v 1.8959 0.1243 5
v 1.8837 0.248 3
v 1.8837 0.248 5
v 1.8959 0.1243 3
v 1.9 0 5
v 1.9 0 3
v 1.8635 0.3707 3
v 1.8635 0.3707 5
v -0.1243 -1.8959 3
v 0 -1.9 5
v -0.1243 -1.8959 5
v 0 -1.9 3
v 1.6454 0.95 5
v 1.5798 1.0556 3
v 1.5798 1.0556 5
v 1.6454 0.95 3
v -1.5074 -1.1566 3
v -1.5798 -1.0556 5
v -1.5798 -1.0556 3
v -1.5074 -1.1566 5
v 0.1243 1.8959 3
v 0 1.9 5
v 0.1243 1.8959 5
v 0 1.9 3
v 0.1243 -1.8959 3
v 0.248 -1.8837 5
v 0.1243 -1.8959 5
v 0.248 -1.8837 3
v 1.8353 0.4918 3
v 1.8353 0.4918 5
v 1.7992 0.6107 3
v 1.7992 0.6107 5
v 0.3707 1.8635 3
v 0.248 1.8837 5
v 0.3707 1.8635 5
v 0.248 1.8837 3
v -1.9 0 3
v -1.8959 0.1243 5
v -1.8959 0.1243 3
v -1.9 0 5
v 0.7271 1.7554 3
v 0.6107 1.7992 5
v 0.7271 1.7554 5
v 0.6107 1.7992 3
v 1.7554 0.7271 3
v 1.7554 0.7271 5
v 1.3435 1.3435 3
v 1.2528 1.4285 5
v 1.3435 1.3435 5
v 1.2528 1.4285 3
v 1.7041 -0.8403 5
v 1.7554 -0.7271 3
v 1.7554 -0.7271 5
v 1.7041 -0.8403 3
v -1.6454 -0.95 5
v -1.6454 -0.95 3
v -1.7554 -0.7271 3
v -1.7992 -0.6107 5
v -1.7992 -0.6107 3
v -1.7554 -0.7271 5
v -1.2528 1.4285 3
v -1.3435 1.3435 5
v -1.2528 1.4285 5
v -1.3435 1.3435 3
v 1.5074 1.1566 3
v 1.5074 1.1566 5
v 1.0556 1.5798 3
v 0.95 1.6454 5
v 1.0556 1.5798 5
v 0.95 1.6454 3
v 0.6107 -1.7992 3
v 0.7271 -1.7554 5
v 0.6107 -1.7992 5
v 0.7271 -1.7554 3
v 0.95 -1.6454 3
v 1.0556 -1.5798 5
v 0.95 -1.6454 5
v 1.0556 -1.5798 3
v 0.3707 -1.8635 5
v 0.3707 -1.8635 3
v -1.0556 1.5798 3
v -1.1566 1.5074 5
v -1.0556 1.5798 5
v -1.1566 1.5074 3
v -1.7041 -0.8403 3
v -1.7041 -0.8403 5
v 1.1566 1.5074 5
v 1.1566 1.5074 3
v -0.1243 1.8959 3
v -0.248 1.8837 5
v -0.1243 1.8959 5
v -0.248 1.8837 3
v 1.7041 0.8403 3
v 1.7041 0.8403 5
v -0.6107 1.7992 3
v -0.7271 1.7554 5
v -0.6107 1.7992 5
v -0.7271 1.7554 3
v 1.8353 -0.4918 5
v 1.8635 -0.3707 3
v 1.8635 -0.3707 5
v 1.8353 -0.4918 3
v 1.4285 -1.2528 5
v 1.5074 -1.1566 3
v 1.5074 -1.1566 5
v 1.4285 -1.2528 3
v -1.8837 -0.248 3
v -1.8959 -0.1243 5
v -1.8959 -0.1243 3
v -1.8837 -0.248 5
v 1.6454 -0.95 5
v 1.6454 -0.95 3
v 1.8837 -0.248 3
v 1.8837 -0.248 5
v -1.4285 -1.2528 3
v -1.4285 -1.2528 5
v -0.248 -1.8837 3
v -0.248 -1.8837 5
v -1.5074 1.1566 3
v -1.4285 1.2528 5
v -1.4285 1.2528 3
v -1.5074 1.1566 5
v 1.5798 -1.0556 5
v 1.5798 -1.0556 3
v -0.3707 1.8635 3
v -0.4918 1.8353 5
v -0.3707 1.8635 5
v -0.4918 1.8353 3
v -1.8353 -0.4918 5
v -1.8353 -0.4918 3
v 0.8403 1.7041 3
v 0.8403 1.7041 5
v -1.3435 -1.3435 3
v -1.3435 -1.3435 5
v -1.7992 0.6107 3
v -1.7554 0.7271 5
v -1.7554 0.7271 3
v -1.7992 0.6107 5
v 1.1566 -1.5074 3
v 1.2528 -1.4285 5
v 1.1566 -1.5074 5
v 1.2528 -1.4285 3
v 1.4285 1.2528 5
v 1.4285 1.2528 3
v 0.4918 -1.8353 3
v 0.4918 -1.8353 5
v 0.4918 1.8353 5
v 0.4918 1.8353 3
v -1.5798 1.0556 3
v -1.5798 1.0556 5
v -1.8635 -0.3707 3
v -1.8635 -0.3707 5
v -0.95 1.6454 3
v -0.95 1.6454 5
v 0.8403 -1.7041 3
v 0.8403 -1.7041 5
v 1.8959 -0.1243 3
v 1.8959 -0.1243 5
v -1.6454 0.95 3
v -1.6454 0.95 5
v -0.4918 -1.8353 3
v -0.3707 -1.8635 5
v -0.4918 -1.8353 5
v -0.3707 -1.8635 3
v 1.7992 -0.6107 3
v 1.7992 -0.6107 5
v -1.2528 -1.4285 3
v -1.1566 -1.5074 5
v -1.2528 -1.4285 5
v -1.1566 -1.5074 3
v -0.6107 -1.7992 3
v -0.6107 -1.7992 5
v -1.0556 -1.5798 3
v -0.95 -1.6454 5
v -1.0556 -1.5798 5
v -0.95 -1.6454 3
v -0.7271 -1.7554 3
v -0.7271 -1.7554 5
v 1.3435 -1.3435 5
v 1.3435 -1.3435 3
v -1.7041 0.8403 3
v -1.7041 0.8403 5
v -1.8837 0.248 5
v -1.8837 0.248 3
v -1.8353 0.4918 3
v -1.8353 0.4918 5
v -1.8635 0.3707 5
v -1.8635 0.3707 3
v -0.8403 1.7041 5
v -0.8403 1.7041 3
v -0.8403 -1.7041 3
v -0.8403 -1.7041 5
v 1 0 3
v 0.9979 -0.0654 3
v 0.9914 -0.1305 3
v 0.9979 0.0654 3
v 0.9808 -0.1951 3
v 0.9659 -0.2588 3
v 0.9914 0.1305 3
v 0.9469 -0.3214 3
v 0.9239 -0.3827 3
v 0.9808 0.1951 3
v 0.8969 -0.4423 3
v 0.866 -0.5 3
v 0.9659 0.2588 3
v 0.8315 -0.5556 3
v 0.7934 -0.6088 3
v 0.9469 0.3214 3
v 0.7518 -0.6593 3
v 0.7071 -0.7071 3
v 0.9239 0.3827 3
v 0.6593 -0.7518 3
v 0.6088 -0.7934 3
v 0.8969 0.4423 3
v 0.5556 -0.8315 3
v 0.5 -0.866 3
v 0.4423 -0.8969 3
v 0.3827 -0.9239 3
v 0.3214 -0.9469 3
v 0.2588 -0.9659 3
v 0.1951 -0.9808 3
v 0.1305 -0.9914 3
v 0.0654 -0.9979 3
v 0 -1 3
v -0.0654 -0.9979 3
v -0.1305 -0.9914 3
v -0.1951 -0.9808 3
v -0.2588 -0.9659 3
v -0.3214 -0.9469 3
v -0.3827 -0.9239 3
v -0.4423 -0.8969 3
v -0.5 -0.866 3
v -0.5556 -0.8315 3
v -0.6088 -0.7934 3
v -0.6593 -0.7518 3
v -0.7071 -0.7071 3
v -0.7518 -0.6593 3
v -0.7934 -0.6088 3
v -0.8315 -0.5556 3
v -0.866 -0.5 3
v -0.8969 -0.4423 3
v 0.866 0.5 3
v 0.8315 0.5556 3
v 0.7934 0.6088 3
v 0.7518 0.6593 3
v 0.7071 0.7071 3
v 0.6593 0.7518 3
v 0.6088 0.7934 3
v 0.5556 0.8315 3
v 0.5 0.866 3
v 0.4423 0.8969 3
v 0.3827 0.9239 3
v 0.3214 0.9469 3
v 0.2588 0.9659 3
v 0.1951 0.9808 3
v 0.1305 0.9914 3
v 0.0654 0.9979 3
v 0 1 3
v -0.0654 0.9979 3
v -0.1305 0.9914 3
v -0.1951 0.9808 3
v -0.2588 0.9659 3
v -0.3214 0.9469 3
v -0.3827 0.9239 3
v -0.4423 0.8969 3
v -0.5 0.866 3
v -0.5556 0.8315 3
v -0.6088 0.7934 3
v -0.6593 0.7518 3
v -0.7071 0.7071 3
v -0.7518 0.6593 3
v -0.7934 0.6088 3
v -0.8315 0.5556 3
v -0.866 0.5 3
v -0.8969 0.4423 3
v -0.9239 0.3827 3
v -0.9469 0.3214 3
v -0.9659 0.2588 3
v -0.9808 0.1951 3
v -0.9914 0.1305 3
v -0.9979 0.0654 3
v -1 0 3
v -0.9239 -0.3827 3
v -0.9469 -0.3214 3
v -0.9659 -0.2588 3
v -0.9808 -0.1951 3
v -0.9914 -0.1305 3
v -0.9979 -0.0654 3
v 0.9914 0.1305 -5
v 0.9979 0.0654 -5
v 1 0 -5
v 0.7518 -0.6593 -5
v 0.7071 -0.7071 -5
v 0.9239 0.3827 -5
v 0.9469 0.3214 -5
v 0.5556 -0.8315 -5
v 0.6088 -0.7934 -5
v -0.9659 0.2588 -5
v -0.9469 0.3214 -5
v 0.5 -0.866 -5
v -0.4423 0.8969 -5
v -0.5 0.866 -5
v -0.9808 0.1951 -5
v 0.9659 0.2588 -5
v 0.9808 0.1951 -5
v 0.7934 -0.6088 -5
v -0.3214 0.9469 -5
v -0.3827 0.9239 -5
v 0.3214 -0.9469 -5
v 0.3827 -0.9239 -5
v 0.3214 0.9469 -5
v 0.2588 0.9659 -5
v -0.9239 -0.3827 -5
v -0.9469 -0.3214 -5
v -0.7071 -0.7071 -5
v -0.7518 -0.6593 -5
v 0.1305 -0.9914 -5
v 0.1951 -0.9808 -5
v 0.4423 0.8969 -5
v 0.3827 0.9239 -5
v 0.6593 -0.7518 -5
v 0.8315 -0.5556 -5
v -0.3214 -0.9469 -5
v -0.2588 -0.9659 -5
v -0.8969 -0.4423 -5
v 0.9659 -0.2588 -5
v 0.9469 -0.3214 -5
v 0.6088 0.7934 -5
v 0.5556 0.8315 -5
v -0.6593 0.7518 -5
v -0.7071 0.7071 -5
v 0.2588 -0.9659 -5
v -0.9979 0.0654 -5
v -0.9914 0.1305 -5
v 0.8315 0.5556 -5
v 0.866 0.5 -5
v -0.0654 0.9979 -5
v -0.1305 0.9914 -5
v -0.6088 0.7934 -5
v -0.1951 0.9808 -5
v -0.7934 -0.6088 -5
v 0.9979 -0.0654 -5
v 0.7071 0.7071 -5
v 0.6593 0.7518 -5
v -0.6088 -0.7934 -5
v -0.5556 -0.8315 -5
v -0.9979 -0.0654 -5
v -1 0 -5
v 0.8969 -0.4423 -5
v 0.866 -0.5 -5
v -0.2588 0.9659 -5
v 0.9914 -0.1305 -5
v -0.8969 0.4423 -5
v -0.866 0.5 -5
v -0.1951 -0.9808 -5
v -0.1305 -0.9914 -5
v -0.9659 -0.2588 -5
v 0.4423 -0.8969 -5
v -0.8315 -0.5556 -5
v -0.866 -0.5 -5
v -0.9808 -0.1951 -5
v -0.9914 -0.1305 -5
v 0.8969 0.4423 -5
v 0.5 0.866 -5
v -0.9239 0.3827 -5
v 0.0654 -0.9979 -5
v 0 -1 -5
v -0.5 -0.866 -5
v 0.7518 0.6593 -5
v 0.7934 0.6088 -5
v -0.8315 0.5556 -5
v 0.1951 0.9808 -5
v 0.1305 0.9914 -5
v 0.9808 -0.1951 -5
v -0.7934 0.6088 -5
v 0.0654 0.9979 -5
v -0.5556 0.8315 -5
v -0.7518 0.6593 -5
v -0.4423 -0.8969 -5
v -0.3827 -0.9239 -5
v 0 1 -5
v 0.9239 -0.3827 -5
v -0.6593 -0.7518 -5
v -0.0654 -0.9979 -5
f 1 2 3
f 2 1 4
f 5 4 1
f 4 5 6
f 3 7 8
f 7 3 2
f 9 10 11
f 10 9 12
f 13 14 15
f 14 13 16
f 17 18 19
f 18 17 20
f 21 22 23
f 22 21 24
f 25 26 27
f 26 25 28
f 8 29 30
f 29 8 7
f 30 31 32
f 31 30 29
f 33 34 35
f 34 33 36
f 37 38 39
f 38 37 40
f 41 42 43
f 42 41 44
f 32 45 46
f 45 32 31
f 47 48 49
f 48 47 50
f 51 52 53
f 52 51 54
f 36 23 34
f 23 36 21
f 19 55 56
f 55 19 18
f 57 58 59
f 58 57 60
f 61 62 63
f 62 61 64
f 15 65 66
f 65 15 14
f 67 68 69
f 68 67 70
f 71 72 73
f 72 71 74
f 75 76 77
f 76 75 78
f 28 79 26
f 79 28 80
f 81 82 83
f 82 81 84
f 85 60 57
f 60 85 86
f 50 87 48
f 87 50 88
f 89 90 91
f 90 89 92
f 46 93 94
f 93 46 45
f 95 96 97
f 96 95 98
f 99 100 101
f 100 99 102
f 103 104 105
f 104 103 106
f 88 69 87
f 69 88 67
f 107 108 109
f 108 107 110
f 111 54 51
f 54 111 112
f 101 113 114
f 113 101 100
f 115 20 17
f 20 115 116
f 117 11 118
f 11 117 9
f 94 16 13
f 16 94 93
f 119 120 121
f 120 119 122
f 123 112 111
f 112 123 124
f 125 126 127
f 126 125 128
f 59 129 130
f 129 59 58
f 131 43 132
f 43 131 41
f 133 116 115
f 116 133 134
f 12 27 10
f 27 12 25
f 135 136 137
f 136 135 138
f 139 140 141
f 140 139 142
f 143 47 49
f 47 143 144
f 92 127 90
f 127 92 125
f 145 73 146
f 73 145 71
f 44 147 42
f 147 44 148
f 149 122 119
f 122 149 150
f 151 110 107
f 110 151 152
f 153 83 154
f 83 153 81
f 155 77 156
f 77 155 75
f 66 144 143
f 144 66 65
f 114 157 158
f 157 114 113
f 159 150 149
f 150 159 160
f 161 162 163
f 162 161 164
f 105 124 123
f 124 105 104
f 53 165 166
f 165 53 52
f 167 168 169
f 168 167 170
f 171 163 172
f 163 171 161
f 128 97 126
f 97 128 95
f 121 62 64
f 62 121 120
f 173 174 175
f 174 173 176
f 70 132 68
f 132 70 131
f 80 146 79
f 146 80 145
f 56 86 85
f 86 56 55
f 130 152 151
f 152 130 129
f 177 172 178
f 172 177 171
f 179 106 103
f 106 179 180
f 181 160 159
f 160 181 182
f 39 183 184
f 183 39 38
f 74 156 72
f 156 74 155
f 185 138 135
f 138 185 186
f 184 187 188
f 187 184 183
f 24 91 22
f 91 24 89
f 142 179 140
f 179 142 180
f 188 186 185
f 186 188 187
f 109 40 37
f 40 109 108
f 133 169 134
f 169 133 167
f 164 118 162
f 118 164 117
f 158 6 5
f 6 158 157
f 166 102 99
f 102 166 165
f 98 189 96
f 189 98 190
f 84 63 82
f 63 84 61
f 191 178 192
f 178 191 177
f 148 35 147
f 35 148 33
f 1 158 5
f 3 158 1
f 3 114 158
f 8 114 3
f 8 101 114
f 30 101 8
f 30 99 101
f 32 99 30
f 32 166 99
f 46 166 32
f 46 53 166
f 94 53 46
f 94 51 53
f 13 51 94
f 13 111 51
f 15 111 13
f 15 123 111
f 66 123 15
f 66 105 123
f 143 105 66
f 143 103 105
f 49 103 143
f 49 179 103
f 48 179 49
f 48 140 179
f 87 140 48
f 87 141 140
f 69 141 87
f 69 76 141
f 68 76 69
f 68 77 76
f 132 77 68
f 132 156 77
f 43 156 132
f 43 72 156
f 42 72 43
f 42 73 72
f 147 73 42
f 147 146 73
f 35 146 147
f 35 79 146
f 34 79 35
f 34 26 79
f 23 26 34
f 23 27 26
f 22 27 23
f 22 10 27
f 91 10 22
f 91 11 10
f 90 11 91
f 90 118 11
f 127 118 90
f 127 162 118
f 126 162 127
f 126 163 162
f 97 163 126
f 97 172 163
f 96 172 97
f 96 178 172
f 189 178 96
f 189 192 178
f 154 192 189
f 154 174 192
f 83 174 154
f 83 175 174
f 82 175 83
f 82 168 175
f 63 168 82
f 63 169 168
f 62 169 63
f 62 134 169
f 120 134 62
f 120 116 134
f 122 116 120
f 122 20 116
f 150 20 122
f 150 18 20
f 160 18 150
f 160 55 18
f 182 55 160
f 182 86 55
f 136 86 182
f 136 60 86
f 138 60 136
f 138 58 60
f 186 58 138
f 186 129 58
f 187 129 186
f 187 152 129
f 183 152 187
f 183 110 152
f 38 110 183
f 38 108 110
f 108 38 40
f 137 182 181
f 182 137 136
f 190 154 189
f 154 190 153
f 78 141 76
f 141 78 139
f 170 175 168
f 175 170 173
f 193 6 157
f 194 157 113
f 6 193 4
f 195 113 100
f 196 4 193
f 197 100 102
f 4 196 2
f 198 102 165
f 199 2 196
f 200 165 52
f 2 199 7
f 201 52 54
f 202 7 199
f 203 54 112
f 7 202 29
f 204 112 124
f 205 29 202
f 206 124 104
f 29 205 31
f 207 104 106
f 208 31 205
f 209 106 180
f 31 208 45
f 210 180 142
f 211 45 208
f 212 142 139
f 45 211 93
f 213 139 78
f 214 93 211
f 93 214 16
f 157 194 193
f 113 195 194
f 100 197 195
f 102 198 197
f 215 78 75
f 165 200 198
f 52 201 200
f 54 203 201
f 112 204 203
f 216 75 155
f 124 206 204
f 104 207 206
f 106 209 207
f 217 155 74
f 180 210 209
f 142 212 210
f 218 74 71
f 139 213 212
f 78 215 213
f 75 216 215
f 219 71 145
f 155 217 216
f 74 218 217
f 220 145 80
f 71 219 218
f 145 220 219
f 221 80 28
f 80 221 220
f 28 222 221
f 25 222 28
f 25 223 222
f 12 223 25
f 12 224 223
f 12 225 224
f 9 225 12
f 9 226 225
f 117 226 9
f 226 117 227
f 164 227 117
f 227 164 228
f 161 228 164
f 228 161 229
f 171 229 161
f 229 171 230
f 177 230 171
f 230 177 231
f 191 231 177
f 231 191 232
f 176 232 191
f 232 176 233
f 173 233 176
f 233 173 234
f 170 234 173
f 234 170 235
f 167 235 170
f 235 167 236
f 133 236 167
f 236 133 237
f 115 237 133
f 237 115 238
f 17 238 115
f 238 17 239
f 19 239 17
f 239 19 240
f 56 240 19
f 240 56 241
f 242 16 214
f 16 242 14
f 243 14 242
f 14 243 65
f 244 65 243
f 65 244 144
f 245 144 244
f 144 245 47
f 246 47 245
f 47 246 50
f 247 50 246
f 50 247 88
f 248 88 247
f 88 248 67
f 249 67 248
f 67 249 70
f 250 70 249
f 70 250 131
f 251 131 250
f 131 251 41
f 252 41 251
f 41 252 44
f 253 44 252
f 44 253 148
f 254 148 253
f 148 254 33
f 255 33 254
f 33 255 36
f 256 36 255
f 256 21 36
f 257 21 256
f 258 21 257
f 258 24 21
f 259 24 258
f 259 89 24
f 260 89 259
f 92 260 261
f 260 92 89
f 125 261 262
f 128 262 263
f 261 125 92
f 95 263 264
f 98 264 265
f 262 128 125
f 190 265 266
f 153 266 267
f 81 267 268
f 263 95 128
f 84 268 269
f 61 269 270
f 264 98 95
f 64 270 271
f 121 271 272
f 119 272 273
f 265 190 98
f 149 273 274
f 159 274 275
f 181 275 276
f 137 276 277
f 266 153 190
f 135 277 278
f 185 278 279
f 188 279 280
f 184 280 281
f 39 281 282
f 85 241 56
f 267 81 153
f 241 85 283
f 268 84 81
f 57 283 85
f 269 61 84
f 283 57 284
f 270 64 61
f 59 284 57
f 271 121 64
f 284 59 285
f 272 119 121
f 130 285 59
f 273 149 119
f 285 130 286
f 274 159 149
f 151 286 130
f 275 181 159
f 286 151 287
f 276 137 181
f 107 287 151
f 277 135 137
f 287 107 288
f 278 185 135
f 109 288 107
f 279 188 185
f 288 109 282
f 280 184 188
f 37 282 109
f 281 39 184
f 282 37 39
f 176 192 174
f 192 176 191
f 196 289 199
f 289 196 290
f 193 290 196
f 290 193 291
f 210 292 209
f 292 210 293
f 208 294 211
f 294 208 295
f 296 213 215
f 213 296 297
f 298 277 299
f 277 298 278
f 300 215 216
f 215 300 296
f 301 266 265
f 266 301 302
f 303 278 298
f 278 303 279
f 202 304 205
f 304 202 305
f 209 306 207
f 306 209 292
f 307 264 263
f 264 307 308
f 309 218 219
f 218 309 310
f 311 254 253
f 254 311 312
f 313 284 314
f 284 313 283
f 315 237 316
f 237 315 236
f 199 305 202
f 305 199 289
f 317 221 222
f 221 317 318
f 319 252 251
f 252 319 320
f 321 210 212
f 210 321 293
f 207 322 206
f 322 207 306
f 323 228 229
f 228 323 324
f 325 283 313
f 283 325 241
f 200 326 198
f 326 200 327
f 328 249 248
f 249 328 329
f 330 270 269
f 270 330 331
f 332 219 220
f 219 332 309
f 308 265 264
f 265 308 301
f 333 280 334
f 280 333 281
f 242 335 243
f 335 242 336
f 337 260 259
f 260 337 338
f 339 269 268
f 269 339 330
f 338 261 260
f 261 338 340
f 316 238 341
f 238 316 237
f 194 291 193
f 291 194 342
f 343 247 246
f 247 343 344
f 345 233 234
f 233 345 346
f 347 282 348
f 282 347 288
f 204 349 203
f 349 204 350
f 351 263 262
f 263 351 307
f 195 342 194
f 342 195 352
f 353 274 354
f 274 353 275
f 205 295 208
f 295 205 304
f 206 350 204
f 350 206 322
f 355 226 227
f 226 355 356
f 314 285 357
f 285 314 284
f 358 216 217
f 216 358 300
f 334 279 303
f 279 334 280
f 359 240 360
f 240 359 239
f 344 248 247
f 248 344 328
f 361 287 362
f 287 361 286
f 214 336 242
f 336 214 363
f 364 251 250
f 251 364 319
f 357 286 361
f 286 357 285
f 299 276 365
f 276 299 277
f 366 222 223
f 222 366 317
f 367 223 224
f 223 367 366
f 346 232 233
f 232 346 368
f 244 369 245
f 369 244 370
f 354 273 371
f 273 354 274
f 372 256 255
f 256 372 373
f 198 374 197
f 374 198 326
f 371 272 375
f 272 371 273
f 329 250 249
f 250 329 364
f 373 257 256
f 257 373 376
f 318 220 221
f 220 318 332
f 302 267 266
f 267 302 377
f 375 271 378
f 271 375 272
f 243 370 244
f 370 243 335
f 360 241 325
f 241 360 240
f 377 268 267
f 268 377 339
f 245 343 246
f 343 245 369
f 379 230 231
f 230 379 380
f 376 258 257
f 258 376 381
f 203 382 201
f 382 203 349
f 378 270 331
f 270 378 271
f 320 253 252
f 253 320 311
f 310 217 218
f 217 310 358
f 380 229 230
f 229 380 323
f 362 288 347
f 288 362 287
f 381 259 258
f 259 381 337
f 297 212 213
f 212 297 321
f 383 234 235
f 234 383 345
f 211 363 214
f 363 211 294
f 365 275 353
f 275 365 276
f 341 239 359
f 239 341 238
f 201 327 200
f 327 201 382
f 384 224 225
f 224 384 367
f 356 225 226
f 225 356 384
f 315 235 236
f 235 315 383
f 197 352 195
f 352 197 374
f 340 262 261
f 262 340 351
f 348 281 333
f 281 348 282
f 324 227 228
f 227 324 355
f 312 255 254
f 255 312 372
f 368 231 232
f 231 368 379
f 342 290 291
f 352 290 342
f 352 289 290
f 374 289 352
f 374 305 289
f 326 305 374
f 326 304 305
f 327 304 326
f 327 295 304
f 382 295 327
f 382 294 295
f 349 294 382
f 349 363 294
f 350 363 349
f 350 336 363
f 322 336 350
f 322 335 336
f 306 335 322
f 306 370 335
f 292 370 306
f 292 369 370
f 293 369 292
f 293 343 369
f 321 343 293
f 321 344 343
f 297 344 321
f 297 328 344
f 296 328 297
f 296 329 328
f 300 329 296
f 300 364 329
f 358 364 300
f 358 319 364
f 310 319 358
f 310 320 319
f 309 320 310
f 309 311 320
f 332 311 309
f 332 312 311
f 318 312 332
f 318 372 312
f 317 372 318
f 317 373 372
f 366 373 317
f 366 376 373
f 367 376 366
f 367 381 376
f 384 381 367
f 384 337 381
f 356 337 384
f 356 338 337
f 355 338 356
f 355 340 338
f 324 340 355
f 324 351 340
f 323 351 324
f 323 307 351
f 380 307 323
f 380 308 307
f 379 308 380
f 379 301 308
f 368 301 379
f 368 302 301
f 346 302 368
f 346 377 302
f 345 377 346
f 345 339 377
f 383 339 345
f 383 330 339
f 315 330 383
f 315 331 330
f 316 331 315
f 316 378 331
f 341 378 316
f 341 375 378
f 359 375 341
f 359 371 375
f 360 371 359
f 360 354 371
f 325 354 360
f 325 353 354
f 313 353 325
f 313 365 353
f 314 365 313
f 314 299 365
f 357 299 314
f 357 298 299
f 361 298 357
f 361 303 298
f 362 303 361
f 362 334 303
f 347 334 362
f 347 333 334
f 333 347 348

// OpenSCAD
$fn=96;

module socket_head_cap_screw(d=2.0, L=10.0, head_d=3.8, head_h=2.0, socket_d=1.5, socket_depth=1.2) {
    union() {
        translate([0,0,-L/2])
            cylinder(h=L, d=d);

        translate([0,0,L/2 - head_h])
            difference() {
                cylinder(h=head_h, d=head_d);
                translate([0,0,head_h - socket_depth])
                    cylinder(h=socket_depth + 0.02, d=socket_d);
            }
    }
}

socket_head_cap_screw();
